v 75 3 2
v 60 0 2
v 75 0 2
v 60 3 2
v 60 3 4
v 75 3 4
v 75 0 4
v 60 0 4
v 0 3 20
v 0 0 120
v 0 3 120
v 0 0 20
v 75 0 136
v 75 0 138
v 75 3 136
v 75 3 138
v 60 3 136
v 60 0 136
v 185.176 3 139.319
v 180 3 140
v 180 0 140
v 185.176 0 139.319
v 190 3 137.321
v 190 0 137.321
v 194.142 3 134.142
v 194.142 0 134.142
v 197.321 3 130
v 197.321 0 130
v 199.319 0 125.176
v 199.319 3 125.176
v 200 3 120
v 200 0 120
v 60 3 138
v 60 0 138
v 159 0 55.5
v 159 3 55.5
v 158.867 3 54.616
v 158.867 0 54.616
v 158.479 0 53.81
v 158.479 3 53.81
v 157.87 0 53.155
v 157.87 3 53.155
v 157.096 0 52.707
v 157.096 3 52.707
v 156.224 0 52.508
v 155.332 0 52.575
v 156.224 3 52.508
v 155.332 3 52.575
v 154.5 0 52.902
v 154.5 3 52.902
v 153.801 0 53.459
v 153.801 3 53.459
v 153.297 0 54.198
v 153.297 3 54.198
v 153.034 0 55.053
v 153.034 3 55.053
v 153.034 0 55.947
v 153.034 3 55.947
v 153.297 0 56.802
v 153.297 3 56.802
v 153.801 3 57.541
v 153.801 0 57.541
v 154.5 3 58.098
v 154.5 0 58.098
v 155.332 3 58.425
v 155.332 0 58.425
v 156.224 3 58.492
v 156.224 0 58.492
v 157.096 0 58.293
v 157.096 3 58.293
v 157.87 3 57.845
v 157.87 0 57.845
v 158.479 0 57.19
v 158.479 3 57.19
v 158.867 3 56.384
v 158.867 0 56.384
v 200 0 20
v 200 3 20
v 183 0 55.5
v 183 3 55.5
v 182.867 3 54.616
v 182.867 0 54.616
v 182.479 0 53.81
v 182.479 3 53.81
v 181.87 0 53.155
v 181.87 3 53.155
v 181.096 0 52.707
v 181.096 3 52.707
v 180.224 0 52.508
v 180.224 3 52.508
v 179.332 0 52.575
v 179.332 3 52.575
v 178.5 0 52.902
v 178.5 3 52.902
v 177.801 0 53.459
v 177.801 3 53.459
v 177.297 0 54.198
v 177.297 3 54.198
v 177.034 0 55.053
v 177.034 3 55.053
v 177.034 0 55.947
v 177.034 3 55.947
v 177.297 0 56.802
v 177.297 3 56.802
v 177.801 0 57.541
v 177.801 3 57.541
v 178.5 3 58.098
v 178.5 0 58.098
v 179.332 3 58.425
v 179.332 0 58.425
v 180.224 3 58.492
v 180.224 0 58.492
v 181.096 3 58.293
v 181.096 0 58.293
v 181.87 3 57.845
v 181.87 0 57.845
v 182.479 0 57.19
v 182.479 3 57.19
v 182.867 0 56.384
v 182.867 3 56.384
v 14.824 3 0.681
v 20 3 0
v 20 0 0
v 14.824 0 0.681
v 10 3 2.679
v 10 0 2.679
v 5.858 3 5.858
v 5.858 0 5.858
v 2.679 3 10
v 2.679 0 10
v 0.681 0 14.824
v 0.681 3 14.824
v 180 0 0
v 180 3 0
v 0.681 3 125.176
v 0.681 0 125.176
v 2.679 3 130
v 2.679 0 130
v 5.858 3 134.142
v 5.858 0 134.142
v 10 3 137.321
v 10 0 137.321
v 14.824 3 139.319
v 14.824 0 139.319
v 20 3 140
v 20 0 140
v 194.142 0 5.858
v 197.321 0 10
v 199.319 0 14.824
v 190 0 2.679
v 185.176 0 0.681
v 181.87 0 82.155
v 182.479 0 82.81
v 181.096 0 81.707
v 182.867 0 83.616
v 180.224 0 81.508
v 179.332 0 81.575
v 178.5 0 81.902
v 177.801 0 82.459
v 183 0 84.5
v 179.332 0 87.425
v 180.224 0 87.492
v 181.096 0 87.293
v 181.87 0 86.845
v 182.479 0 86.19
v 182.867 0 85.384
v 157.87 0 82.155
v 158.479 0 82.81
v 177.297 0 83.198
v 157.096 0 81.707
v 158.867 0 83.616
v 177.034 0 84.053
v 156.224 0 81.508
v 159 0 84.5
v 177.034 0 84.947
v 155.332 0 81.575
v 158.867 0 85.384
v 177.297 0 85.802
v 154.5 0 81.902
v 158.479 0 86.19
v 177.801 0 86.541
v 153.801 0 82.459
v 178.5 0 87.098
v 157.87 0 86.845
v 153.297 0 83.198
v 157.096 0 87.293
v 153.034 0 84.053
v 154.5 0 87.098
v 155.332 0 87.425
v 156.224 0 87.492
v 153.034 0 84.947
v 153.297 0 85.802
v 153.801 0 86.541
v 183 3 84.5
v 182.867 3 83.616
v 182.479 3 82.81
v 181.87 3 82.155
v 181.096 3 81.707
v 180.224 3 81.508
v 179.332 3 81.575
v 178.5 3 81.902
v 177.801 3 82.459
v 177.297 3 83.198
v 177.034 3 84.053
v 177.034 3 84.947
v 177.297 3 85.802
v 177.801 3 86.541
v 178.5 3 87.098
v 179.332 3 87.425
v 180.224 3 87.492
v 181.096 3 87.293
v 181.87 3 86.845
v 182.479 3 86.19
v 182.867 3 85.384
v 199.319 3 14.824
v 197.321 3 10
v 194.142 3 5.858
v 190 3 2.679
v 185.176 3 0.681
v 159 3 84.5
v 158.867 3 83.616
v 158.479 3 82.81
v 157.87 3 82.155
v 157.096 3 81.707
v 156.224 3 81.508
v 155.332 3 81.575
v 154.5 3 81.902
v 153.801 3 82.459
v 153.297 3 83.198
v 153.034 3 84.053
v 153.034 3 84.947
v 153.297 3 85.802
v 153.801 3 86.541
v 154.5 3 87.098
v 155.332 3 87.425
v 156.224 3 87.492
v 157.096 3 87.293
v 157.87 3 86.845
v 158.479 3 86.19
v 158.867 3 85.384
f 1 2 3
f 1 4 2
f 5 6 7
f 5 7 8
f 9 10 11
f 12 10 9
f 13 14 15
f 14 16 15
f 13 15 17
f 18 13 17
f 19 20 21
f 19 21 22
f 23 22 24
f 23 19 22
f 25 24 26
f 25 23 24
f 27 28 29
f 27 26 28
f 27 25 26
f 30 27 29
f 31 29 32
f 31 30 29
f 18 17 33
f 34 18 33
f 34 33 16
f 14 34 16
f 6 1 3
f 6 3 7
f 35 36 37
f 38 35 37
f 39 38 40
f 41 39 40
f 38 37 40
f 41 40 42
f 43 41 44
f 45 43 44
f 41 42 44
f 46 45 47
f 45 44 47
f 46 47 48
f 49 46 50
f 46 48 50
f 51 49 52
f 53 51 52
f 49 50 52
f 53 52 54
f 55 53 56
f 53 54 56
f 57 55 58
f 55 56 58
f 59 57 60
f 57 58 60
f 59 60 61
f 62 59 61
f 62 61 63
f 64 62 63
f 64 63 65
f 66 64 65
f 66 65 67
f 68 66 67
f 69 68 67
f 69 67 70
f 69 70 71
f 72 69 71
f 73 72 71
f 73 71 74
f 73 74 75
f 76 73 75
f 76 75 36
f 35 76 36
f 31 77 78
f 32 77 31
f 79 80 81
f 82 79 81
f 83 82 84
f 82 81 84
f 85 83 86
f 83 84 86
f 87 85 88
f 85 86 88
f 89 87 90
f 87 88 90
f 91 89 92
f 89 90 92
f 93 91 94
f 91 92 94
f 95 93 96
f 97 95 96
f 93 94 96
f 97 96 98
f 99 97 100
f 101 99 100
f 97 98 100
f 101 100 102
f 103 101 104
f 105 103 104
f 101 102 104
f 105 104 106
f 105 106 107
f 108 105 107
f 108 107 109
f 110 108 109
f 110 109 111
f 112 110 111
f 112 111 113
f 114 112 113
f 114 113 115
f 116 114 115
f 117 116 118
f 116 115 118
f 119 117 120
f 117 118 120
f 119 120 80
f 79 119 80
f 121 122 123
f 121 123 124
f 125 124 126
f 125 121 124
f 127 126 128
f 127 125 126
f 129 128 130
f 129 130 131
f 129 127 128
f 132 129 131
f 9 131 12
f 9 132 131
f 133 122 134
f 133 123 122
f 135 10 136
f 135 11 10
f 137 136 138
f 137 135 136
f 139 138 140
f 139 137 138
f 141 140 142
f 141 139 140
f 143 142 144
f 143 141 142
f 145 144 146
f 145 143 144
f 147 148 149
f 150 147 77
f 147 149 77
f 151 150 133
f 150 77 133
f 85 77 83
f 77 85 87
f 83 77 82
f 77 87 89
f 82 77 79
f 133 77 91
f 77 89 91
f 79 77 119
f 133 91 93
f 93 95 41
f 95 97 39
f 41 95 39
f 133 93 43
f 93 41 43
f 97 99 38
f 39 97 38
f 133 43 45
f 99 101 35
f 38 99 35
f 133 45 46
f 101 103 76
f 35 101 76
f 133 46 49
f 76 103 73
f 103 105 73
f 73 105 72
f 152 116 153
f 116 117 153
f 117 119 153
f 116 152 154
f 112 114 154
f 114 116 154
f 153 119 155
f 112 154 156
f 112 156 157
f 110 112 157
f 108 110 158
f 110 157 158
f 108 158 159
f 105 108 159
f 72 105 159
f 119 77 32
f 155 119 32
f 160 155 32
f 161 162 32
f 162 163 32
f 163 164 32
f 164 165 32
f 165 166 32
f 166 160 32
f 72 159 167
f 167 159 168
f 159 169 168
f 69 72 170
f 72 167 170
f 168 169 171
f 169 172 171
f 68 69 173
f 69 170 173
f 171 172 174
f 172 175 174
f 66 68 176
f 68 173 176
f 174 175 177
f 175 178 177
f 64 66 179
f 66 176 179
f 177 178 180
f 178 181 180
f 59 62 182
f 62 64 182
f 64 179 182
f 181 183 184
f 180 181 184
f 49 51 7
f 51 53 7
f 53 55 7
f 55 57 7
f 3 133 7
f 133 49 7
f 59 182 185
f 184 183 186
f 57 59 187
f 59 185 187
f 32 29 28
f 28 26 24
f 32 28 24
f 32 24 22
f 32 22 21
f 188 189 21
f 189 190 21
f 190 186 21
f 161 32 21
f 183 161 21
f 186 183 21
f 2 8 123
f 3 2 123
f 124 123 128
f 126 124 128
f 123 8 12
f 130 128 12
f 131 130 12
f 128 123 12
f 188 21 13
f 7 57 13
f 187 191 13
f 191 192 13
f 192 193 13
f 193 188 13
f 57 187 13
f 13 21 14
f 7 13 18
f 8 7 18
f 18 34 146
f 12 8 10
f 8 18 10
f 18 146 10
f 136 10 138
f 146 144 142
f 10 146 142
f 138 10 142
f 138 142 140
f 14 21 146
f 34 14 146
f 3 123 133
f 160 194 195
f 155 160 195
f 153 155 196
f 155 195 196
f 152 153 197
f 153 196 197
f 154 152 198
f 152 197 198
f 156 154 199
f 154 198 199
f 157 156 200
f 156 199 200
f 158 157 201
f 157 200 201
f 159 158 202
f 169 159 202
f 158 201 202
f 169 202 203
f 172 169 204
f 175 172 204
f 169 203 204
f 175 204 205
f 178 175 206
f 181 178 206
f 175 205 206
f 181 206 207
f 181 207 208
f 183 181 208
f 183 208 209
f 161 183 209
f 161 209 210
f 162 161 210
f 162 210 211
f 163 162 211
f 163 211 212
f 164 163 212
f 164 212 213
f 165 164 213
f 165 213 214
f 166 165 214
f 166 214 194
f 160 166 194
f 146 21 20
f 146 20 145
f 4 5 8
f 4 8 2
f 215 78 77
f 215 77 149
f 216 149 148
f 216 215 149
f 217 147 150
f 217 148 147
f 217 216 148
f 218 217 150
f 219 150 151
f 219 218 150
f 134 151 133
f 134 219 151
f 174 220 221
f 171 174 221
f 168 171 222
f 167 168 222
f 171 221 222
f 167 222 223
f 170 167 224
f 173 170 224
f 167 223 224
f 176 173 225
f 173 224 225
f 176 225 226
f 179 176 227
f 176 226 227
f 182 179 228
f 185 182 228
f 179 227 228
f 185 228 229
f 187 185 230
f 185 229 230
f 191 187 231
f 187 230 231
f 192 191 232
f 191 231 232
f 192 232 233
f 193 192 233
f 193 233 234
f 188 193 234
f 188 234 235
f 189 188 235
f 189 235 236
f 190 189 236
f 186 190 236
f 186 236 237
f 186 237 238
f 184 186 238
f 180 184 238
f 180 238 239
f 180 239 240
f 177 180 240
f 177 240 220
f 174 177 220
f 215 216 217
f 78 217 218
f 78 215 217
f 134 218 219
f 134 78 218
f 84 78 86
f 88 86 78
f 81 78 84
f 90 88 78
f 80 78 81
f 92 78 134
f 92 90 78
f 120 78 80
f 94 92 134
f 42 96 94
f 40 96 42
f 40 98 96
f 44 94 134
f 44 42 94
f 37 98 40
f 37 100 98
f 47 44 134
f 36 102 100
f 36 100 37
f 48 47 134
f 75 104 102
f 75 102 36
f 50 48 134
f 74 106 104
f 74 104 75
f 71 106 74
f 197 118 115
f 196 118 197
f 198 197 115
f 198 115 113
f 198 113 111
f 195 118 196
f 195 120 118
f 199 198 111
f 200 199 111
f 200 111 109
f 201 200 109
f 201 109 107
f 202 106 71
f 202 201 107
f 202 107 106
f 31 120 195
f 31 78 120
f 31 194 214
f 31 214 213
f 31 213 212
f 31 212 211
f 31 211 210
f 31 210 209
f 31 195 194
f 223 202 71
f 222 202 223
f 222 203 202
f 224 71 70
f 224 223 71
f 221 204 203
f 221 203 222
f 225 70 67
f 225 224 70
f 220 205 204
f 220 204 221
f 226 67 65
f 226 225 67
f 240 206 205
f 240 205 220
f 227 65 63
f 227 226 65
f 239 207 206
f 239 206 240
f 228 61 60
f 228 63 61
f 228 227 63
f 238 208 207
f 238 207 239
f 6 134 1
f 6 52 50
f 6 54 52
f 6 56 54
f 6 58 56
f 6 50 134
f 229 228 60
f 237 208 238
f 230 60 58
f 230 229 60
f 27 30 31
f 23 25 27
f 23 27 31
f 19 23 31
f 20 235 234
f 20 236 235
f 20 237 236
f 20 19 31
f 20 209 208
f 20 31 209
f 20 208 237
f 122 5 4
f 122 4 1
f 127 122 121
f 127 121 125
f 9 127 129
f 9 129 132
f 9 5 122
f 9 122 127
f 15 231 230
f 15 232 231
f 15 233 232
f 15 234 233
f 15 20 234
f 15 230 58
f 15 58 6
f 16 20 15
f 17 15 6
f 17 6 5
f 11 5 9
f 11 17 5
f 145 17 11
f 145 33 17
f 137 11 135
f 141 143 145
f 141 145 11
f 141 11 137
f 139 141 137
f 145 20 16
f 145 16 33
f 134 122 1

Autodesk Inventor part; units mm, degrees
ref_plane "YZ Plane" through (0, 0, 0) normal (1, 0, 0) x (0, 1, 0)
ref_plane "XZ Plane" through (0, 0, 0) normal (0, 1, 0) x (-1, 0, 0)
ref_plane "XY Plane" through (0, 0, 0) normal (0, 0, 1) x (1, 0, 0)
sketch "Szkic1" plane through (0, 0, 0) normal (0, 1, 0) x (-1, 0, 0)
  line L0 (0, 0) -> (-200, 0)
  line L1 (-200, 0) -> (-200, 140)
  line L2 (-200, 140) -> (0, 140)
  line L3 (0, 140) -> (0, 0)
  dimension "d0" = 200
  dimension "d1" = 140
extrude "Wyciągnięcie proste1" add sketch "Szkic1" along normal blind 3
sketch "Szkic2" plane through (0, 3, 0) normal (0, 1, 0) x (1, 0, 0)
  line L0 (0, 0) -> (50, 0)
  line L1 (200, 0) -> (0, 0) projected
  line L2 (50, 0) -> (60, 0)
  line L3 (60, 0) -> (60, -2)
  line L4 (60, -2) -> (75, -2)
  line L5 (75, -2) -> (75, -4)
  line L6 (75, -4) -> (60, -4)
  line L7 (60, -4) -> (60, -2)
  line L8 (0, 0) -> (0, -140) projected
  line L9 (0, -70) -> (200, -70)
  line L10 (200, -140) -> (200, 0) projected
  line L11 (60, -140) -> (60, -138)
  line L12 (60, -138) -> (75, -138)
  line L13 (75, -138) -> (75, -136)
  line L14 (75, -136) -> (60, -136)
  line L15 (60, -136) -> (60, -138)
  dimension "d4" = 50
  dimension "d5" = 10
  dimension "d6" = 2
  dimension "d7" = 15
  dimension "d8" = 2
extrude "Wyciągnięcie proste2" cut sketch "Szkic2" against normal blind 3 contours L4 L5 L6 L7 | L15 L14 L13 L12
sketch "Szkic3" plane through (0, 3, 0) normal (0, 1, 0) x (1, 0, 0)
  line L0 (200, -140) -> (200, 0) projected
  line L1 (0, -140) -> (200, -140) projected
  line L2 (200, 0) -> (180, 0)
  line L3 (180, 0) -> (180, -140)
  line L4 (180, -140) -> (200, -140)
  line L5 (200, -140) -> (200, 0)
  line L6 (180, -70) -> (180, -53)
  line L7 (180, -53) -> (180, -55.5)
  circle A0 centre (180, -55.5) radius 3
  line L8 (180, -55.5) -> (156, -55.5)
  circle A1 centre (156, -55.5) radius 3
  line L9 (200, -70) -> (129.0719, -70)
  circle A2 centre (180, -84.5) radius 3
  circle A3 centre (156, -84.5) radius 3
  point P0 (0, 0)
  dimension "d11" = 20
  dimension "d12" = 17
  dimension "d13" = 2.5
  dimension "d14" = 6
  dimension "d15" = 24
  dimension "d16" = 6
extrude "Wyciągnięcie proste3" cut sketch "Szkic3" against normal blind 3 contours A1 | A2 L3 | L3 A2 | A0 L8 L3 | L3 A0 | L3 L8 A0 | A3
fillet "Zaokrąglenie1" radius 20 4 edges at (0, 1.5, 140) (0, 1.5, 0) (200, 1.5, 0) (200, 1.5, 140)
properties part number "podstawa"
